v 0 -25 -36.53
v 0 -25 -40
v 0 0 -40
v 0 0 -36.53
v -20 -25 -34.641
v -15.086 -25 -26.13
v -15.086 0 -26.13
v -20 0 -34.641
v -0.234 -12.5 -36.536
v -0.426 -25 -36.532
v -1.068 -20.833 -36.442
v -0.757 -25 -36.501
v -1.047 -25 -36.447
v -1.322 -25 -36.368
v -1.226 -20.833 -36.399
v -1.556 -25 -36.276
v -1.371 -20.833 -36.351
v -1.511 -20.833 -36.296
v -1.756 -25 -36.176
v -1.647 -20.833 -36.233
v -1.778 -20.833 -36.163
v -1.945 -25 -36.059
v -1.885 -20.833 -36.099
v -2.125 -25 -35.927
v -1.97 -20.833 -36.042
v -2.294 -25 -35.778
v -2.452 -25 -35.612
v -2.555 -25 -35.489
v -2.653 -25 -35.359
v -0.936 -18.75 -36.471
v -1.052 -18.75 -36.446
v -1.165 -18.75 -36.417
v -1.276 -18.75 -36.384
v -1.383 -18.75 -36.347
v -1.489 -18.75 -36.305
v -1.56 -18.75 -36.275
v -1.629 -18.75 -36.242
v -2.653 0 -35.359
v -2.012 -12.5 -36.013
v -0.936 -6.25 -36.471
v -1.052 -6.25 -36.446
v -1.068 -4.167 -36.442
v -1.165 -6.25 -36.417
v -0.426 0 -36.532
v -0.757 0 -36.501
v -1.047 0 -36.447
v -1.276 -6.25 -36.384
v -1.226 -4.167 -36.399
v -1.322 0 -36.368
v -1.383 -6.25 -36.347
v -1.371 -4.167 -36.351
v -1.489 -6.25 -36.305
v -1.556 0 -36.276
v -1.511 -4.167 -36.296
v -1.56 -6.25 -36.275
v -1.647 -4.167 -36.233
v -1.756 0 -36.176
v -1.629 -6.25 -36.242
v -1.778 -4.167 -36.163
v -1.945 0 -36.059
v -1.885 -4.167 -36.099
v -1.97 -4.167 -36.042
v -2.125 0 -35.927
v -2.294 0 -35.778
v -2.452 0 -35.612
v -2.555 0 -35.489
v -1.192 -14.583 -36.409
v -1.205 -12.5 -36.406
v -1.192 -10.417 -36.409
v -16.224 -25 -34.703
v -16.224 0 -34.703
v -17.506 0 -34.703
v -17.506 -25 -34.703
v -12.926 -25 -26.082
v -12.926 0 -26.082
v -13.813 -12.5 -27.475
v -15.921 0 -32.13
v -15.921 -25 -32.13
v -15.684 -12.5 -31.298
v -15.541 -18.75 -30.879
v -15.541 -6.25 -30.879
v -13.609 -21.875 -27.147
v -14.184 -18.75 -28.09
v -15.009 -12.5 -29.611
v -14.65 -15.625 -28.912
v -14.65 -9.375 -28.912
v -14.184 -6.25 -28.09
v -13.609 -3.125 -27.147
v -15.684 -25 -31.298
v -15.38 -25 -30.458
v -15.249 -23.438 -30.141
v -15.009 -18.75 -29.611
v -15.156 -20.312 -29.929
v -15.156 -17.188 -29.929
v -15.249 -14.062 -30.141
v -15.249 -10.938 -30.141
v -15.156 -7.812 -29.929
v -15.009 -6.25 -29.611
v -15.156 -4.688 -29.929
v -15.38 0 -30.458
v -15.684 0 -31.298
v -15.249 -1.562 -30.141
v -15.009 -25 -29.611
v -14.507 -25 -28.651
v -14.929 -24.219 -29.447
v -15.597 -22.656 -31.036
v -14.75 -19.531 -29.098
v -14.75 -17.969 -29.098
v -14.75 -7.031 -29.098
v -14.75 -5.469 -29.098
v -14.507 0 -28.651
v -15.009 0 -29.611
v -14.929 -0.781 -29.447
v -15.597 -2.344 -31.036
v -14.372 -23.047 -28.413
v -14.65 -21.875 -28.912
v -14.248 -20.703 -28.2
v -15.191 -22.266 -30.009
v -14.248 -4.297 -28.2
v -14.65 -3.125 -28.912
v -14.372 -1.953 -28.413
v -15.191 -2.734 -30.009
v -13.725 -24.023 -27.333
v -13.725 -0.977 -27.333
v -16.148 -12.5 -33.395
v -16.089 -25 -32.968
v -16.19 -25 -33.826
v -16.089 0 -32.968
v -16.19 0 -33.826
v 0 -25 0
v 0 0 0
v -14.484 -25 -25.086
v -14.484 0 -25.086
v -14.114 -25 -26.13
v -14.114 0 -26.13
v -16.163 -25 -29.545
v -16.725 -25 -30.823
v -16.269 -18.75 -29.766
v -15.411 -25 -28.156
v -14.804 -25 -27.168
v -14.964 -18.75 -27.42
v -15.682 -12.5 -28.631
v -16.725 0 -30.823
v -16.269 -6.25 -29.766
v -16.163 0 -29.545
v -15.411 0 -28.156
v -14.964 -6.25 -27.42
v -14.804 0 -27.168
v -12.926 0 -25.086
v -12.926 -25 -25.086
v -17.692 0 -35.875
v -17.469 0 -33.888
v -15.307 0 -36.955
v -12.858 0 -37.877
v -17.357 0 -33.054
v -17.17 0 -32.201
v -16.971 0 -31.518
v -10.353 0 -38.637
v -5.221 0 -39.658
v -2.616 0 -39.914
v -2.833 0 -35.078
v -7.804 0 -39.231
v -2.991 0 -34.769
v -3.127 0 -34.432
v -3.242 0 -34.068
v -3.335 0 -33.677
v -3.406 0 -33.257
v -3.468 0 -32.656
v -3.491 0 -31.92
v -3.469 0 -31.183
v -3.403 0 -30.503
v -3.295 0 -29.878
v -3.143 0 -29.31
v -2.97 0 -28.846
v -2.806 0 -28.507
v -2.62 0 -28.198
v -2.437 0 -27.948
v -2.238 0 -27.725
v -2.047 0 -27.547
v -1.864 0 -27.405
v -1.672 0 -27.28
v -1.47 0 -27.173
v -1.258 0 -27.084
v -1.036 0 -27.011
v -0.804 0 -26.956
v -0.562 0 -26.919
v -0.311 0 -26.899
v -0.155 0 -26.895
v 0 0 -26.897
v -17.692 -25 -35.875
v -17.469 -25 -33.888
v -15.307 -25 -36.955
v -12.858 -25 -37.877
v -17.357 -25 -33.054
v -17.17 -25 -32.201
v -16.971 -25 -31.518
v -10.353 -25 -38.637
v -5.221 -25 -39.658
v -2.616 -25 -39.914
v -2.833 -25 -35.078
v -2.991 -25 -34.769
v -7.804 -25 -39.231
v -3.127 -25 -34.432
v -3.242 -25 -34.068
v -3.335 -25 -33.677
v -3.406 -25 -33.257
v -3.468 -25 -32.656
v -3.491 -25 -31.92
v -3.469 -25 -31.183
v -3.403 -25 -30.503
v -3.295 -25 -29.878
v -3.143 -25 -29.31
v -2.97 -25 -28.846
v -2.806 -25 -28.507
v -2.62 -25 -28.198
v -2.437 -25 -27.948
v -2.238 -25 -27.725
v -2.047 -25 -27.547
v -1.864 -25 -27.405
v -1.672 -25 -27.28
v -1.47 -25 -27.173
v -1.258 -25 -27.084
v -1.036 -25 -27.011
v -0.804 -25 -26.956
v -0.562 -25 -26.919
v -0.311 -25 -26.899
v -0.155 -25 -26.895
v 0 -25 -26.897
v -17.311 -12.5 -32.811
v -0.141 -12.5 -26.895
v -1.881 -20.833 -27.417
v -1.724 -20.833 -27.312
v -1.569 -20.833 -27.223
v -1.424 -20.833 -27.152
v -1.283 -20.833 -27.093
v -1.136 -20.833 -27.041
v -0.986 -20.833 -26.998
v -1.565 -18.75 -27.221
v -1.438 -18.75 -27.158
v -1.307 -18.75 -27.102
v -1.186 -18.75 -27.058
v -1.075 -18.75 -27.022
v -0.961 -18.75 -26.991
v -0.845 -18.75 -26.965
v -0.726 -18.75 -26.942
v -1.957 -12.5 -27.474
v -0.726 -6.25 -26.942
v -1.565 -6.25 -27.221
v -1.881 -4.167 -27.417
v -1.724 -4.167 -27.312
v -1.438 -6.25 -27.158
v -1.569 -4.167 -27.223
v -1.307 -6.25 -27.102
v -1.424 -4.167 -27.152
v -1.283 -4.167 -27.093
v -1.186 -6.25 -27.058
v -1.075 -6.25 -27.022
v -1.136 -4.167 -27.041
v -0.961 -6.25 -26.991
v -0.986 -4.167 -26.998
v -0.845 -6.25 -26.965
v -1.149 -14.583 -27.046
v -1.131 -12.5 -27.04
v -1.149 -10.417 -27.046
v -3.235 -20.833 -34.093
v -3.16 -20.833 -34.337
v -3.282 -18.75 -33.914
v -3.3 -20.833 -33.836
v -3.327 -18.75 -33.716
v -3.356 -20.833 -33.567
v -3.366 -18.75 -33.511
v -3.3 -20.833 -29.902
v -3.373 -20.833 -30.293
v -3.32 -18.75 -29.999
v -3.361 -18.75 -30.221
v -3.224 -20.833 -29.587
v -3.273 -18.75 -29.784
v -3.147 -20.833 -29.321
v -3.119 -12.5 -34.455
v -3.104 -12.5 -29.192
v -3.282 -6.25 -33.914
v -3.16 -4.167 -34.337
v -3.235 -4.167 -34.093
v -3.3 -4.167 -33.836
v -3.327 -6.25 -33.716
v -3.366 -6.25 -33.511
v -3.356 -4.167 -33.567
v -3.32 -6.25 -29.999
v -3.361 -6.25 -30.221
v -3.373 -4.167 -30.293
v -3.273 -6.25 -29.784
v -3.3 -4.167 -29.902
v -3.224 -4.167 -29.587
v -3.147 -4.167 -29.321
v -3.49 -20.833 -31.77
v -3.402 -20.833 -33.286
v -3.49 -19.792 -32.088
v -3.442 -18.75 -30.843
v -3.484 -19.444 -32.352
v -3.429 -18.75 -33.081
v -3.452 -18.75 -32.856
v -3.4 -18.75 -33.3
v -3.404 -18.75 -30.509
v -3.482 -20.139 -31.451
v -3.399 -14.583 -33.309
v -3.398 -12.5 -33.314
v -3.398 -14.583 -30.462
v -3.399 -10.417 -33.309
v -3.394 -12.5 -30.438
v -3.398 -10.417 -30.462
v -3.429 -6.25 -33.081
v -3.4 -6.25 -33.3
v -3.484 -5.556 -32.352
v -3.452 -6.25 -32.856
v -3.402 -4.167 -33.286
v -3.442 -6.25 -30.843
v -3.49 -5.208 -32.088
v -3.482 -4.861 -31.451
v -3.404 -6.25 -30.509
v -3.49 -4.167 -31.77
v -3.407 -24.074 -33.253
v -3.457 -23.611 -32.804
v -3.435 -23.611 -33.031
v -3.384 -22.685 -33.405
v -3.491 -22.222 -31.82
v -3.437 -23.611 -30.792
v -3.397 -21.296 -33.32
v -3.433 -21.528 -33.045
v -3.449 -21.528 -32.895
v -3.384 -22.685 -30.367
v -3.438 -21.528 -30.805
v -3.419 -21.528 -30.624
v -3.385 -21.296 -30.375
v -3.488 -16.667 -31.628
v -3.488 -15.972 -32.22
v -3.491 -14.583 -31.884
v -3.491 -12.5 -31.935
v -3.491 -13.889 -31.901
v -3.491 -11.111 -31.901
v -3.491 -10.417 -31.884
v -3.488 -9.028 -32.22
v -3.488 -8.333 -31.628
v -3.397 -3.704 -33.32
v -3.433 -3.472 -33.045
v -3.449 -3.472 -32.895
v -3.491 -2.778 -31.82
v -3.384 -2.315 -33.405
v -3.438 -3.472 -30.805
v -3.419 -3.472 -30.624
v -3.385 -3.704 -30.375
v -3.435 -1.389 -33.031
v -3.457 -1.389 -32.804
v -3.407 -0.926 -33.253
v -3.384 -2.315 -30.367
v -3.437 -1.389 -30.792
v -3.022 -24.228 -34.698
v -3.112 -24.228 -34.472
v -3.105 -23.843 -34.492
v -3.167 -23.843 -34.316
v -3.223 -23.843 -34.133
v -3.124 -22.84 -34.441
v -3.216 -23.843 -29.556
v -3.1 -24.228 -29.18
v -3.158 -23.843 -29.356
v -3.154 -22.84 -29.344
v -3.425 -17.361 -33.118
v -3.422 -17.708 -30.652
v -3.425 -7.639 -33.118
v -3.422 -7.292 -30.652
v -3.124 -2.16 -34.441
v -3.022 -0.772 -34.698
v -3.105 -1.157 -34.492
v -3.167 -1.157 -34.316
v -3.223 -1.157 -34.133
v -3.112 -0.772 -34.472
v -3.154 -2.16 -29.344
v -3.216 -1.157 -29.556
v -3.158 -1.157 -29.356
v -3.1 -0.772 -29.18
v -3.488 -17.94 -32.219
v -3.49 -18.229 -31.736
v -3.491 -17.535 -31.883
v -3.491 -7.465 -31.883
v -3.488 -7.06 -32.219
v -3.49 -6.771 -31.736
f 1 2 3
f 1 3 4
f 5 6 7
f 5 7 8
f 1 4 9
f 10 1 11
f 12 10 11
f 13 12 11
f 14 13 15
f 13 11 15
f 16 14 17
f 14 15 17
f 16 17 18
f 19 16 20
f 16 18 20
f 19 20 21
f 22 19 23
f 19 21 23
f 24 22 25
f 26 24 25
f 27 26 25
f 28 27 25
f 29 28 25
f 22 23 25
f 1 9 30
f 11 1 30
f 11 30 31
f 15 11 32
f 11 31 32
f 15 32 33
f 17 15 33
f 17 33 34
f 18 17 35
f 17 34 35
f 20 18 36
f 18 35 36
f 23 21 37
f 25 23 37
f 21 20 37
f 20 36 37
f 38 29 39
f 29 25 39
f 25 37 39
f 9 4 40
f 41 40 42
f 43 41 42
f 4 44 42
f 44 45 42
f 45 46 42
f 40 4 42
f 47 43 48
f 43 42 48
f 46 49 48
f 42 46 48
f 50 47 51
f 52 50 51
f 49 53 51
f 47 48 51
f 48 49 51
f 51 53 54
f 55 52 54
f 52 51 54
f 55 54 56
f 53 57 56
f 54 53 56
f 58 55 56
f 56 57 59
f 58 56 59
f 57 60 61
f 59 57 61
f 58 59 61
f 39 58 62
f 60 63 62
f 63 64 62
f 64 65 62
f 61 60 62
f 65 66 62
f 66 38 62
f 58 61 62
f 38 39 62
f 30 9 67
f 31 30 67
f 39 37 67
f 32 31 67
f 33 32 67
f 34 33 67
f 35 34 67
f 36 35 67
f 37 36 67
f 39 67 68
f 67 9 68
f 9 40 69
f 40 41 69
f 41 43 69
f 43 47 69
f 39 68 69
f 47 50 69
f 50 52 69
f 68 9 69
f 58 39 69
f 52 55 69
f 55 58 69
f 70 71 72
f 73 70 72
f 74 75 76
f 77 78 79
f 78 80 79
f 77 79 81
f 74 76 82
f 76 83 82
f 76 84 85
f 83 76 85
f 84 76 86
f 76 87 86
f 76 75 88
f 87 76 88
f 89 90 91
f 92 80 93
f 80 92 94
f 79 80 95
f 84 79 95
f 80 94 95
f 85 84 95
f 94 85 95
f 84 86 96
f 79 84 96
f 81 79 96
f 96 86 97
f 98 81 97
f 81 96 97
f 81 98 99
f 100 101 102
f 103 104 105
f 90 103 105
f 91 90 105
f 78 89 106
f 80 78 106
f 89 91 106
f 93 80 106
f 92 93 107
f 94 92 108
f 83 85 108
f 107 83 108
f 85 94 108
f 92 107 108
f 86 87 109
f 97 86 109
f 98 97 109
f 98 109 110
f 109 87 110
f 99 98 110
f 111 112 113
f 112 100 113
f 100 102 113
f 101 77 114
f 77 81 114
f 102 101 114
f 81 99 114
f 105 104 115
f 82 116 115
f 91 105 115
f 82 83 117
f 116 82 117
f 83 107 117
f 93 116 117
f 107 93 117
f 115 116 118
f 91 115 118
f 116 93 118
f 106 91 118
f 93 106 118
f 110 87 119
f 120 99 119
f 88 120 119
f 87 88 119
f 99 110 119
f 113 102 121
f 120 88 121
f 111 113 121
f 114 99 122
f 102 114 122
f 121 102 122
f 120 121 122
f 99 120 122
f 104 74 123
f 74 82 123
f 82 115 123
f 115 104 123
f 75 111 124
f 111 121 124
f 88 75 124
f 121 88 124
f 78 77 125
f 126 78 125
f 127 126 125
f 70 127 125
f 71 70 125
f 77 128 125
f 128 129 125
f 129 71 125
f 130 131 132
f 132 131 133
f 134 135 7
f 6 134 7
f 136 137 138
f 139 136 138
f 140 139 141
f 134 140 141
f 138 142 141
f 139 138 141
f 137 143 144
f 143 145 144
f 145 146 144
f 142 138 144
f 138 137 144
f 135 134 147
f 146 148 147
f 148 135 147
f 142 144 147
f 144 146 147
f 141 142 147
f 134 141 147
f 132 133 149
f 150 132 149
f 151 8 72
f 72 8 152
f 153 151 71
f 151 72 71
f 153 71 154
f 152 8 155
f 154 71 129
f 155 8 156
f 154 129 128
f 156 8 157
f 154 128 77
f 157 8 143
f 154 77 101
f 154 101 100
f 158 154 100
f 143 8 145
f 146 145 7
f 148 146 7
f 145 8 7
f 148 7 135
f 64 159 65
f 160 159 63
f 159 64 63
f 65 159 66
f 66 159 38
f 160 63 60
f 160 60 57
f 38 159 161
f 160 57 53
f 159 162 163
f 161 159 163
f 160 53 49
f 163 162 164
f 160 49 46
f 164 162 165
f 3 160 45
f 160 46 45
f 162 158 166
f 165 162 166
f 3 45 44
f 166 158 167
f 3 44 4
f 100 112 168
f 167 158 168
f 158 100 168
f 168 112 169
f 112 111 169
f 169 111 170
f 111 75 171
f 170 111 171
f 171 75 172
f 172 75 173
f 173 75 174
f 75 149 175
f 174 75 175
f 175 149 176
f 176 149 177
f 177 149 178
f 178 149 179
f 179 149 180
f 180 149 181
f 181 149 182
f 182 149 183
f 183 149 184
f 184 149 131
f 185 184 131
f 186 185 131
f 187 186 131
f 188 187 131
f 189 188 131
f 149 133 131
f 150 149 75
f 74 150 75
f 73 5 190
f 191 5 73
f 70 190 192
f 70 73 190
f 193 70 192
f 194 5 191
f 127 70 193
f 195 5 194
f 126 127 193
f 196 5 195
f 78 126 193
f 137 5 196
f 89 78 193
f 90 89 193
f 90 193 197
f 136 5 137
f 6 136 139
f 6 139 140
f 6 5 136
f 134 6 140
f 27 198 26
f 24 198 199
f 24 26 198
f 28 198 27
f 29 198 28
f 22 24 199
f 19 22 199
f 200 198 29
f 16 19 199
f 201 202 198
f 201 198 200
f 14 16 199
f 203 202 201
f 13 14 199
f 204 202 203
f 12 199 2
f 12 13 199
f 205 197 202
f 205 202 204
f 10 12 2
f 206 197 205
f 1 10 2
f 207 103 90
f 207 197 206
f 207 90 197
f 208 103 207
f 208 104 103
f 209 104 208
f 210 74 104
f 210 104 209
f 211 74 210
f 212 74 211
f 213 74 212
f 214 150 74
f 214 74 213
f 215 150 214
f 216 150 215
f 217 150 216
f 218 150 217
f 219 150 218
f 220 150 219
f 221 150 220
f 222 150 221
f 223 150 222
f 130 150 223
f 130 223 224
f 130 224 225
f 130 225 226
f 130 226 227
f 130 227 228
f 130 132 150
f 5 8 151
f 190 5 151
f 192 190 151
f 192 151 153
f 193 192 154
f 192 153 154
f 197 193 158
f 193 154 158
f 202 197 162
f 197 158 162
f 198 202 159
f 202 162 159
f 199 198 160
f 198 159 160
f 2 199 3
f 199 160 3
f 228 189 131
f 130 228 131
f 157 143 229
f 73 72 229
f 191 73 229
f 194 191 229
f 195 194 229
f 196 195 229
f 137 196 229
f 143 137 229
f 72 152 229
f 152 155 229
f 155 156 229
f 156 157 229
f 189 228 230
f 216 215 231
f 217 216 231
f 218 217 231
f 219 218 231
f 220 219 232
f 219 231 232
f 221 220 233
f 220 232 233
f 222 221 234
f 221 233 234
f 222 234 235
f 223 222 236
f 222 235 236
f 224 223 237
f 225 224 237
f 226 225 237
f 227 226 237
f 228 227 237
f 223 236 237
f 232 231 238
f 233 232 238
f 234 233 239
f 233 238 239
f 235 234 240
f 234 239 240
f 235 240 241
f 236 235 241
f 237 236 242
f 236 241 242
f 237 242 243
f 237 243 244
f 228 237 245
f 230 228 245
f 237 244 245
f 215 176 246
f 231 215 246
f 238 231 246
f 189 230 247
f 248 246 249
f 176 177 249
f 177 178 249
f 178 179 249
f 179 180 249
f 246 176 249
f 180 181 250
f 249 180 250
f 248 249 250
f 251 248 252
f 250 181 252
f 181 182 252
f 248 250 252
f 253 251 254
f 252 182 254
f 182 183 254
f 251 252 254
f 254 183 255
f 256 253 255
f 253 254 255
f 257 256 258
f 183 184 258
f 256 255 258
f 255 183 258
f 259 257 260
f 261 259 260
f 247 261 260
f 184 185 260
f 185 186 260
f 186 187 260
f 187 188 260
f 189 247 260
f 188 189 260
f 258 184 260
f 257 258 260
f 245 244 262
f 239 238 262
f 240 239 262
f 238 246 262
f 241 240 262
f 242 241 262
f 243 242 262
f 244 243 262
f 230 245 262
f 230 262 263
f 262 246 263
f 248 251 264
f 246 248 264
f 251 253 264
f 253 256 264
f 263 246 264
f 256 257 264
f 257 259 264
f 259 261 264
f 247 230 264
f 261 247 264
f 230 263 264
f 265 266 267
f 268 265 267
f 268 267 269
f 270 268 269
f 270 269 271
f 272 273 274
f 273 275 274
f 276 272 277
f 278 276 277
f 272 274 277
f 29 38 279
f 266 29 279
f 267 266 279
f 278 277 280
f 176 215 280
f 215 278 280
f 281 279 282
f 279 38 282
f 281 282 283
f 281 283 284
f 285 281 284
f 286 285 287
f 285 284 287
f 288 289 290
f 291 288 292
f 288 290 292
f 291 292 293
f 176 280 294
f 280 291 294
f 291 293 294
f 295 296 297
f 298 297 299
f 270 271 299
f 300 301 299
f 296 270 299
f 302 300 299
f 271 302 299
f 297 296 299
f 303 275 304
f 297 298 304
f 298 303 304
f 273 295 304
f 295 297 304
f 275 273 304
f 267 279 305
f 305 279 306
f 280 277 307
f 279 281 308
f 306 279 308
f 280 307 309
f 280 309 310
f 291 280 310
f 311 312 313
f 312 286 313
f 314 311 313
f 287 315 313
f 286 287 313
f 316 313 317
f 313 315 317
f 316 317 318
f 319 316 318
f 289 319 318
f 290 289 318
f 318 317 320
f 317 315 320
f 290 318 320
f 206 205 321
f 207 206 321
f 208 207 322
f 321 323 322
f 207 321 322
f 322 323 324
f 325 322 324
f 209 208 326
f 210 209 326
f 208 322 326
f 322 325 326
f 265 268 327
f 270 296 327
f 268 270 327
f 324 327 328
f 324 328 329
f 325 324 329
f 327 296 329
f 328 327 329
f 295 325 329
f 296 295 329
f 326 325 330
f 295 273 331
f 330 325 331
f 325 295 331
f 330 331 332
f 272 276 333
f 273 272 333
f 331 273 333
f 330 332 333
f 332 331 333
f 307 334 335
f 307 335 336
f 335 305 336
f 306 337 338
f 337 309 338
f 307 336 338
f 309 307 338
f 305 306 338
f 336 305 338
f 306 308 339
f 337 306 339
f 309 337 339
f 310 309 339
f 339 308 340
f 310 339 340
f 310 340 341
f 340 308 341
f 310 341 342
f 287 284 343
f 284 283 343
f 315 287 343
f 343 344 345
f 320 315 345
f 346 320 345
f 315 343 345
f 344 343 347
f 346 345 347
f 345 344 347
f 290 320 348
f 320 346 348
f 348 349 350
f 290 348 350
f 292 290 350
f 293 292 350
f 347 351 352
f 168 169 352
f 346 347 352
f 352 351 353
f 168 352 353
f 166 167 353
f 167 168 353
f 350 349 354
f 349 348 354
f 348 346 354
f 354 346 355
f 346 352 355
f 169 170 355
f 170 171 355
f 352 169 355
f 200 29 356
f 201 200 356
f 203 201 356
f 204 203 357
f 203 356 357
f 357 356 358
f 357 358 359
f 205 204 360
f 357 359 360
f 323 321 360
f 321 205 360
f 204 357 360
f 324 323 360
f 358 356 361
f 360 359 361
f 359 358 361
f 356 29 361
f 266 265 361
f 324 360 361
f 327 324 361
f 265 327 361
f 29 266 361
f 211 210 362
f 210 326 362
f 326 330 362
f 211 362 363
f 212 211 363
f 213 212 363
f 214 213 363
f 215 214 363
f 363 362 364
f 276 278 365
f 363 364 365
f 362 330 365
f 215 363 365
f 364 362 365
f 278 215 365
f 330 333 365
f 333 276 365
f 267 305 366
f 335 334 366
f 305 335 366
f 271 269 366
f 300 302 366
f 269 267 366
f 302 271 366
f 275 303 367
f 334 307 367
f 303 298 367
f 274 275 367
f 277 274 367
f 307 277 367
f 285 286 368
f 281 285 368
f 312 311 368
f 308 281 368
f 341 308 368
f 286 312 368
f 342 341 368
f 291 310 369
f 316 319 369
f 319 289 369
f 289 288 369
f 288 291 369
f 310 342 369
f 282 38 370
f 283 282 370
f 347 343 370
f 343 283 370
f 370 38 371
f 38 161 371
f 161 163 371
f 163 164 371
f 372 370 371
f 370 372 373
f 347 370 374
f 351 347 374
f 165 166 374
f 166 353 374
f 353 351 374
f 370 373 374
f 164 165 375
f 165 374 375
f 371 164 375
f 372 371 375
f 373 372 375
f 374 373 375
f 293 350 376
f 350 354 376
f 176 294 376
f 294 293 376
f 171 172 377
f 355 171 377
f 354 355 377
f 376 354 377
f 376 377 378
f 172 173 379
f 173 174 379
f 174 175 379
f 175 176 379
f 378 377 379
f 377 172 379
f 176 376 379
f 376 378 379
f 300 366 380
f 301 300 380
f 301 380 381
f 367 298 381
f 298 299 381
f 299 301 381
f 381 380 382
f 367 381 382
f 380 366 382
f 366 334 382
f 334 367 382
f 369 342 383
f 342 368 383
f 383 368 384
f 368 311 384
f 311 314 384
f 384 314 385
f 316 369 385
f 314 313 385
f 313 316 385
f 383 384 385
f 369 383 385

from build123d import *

# Parameters (mm, degrees)
F1_DEPTH = 25


# Not quite as in the source:
# - the program builds the solid bodies; features that only make, move or delete a surface that nothing else refers to are left out


with BuildPart() as f1:
    # F0 (on Front) → F1 (new body)
    with BuildSketch(Plane.XZ):
        with BuildLine():
            ThreePointArc((-20, -34.6410161514), (-10.3527618041, -38.6370330516), (0, -40))
            Line((0, -40), (0, -36.5303086516))
            add(Edge.make_bspline(
                [(0, -36.5303086516), (-0.1149220611, -36.5363907695), (-0.234185262, -36.5363907695)],
                knots=[0.9158257876, 0.9158257876, 0.9158257876, 1, 1, 1], degree=2))
            add(Edge.make_bspline(
                [(-0.234185262, -36.5363907695), (-1.8148580784, -36.5363907695), (-2.6530614293, -35.3588639809)],
                knots=[0, 0, 0, 1, 1, 1], degree=2))
            add(Edge.make_bspline(
                [(-2.6530614293, -35.3588639809), (-3.4912647801, -34.1813371924), (-3.4912647801, -31.9347820187)],
                knots=[0, 0, 0, 1, 1, 1], degree=2))
            add(Edge.make_bspline(
                [(-3.4912647801, -31.9347820187), (-3.4912647801, -29.5010139137), (-2.6200864243, -28.1979693646)],
                knots=[0, 0, 0, 1, 1, 1], degree=2))
            add(Edge.make_bspline(
                [(-2.6200864243, -28.1979693646), (-1.7489080686, -26.8949248154), (-0.1405787965, -26.8949248154)],
                knots=[0, 0, 0, 1, 1, 1], degree=2))
            add(Edge.make_bspline(
                [(-0.1405787965, -26.8949248154), (-0.0694054692, -26.8949248154), (0, -26.8970735535)],
                knots=[0, 0, 0, 0.0335559038, 0.0335559038, 0.0335559038], degree=2))
            Line((0, -26.8970735535), (0, 0))
            Line((0, 0), (-14.4835999879, -25.0863310555))
            Line((-14.4835999879, -25.0863310555), (-12.9261437307, -25.0863310555))
            Line((-12.9261437307, -25.0863310555), (-12.9261437307, -26.0823037829))
            add(Edge.make_bspline(
                [(-12.9261437307, -26.0823037829), (-14.4004454653, -28.334163173), (-15.0087314402, -29.6107992676)],
                knots=[0, 0, 0, 1, 1, 1], degree=2))
            add(Edge.make_bspline(
                [(-15.0087314402, -29.6107992676), (-15.6170174151, -30.8874353622), (-15.9206143649, -32.1302171206)],
                knots=[0, 0, 0, 1, 1, 1], degree=2))
            add(Edge.make_bspline(
                [(-15.9206143649, -32.1302171206), (-16.2242113147, -33.3729988791), (-16.2242113147, -34.7031466663)],
                knots=[0, 0, 0, 1, 1, 1], degree=2))
            Line((-16.2242113147, -34.7031466663), (-17.5063077861, -34.7031466663))
            add(Edge.make_bspline(
                [(-17.5063077861, -34.7031466663), (-17.5063077861, -32.8597234604), (-16.7254739044, -30.823002916)],
                knots=[0, 0, 0, 1, 1, 1], degree=2))
            add(Edge.make_bspline(
                [(-16.7254739044, -30.823002916), (-15.9446400228, -28.7862823716), (-14.1143217212, -26.1303550987)],
                knots=[0, 0, 0, 1, 1, 1], degree=2))
            Line((-14.1143217212, -26.1303550987), (-15.0863675502, -26.1303550987))
            Line((-15.0863675502, -26.1303550987), (-20, -34.6410161514))
        make_face()
    extrude(amount=F1_DEPTH)


solid = f1.part
